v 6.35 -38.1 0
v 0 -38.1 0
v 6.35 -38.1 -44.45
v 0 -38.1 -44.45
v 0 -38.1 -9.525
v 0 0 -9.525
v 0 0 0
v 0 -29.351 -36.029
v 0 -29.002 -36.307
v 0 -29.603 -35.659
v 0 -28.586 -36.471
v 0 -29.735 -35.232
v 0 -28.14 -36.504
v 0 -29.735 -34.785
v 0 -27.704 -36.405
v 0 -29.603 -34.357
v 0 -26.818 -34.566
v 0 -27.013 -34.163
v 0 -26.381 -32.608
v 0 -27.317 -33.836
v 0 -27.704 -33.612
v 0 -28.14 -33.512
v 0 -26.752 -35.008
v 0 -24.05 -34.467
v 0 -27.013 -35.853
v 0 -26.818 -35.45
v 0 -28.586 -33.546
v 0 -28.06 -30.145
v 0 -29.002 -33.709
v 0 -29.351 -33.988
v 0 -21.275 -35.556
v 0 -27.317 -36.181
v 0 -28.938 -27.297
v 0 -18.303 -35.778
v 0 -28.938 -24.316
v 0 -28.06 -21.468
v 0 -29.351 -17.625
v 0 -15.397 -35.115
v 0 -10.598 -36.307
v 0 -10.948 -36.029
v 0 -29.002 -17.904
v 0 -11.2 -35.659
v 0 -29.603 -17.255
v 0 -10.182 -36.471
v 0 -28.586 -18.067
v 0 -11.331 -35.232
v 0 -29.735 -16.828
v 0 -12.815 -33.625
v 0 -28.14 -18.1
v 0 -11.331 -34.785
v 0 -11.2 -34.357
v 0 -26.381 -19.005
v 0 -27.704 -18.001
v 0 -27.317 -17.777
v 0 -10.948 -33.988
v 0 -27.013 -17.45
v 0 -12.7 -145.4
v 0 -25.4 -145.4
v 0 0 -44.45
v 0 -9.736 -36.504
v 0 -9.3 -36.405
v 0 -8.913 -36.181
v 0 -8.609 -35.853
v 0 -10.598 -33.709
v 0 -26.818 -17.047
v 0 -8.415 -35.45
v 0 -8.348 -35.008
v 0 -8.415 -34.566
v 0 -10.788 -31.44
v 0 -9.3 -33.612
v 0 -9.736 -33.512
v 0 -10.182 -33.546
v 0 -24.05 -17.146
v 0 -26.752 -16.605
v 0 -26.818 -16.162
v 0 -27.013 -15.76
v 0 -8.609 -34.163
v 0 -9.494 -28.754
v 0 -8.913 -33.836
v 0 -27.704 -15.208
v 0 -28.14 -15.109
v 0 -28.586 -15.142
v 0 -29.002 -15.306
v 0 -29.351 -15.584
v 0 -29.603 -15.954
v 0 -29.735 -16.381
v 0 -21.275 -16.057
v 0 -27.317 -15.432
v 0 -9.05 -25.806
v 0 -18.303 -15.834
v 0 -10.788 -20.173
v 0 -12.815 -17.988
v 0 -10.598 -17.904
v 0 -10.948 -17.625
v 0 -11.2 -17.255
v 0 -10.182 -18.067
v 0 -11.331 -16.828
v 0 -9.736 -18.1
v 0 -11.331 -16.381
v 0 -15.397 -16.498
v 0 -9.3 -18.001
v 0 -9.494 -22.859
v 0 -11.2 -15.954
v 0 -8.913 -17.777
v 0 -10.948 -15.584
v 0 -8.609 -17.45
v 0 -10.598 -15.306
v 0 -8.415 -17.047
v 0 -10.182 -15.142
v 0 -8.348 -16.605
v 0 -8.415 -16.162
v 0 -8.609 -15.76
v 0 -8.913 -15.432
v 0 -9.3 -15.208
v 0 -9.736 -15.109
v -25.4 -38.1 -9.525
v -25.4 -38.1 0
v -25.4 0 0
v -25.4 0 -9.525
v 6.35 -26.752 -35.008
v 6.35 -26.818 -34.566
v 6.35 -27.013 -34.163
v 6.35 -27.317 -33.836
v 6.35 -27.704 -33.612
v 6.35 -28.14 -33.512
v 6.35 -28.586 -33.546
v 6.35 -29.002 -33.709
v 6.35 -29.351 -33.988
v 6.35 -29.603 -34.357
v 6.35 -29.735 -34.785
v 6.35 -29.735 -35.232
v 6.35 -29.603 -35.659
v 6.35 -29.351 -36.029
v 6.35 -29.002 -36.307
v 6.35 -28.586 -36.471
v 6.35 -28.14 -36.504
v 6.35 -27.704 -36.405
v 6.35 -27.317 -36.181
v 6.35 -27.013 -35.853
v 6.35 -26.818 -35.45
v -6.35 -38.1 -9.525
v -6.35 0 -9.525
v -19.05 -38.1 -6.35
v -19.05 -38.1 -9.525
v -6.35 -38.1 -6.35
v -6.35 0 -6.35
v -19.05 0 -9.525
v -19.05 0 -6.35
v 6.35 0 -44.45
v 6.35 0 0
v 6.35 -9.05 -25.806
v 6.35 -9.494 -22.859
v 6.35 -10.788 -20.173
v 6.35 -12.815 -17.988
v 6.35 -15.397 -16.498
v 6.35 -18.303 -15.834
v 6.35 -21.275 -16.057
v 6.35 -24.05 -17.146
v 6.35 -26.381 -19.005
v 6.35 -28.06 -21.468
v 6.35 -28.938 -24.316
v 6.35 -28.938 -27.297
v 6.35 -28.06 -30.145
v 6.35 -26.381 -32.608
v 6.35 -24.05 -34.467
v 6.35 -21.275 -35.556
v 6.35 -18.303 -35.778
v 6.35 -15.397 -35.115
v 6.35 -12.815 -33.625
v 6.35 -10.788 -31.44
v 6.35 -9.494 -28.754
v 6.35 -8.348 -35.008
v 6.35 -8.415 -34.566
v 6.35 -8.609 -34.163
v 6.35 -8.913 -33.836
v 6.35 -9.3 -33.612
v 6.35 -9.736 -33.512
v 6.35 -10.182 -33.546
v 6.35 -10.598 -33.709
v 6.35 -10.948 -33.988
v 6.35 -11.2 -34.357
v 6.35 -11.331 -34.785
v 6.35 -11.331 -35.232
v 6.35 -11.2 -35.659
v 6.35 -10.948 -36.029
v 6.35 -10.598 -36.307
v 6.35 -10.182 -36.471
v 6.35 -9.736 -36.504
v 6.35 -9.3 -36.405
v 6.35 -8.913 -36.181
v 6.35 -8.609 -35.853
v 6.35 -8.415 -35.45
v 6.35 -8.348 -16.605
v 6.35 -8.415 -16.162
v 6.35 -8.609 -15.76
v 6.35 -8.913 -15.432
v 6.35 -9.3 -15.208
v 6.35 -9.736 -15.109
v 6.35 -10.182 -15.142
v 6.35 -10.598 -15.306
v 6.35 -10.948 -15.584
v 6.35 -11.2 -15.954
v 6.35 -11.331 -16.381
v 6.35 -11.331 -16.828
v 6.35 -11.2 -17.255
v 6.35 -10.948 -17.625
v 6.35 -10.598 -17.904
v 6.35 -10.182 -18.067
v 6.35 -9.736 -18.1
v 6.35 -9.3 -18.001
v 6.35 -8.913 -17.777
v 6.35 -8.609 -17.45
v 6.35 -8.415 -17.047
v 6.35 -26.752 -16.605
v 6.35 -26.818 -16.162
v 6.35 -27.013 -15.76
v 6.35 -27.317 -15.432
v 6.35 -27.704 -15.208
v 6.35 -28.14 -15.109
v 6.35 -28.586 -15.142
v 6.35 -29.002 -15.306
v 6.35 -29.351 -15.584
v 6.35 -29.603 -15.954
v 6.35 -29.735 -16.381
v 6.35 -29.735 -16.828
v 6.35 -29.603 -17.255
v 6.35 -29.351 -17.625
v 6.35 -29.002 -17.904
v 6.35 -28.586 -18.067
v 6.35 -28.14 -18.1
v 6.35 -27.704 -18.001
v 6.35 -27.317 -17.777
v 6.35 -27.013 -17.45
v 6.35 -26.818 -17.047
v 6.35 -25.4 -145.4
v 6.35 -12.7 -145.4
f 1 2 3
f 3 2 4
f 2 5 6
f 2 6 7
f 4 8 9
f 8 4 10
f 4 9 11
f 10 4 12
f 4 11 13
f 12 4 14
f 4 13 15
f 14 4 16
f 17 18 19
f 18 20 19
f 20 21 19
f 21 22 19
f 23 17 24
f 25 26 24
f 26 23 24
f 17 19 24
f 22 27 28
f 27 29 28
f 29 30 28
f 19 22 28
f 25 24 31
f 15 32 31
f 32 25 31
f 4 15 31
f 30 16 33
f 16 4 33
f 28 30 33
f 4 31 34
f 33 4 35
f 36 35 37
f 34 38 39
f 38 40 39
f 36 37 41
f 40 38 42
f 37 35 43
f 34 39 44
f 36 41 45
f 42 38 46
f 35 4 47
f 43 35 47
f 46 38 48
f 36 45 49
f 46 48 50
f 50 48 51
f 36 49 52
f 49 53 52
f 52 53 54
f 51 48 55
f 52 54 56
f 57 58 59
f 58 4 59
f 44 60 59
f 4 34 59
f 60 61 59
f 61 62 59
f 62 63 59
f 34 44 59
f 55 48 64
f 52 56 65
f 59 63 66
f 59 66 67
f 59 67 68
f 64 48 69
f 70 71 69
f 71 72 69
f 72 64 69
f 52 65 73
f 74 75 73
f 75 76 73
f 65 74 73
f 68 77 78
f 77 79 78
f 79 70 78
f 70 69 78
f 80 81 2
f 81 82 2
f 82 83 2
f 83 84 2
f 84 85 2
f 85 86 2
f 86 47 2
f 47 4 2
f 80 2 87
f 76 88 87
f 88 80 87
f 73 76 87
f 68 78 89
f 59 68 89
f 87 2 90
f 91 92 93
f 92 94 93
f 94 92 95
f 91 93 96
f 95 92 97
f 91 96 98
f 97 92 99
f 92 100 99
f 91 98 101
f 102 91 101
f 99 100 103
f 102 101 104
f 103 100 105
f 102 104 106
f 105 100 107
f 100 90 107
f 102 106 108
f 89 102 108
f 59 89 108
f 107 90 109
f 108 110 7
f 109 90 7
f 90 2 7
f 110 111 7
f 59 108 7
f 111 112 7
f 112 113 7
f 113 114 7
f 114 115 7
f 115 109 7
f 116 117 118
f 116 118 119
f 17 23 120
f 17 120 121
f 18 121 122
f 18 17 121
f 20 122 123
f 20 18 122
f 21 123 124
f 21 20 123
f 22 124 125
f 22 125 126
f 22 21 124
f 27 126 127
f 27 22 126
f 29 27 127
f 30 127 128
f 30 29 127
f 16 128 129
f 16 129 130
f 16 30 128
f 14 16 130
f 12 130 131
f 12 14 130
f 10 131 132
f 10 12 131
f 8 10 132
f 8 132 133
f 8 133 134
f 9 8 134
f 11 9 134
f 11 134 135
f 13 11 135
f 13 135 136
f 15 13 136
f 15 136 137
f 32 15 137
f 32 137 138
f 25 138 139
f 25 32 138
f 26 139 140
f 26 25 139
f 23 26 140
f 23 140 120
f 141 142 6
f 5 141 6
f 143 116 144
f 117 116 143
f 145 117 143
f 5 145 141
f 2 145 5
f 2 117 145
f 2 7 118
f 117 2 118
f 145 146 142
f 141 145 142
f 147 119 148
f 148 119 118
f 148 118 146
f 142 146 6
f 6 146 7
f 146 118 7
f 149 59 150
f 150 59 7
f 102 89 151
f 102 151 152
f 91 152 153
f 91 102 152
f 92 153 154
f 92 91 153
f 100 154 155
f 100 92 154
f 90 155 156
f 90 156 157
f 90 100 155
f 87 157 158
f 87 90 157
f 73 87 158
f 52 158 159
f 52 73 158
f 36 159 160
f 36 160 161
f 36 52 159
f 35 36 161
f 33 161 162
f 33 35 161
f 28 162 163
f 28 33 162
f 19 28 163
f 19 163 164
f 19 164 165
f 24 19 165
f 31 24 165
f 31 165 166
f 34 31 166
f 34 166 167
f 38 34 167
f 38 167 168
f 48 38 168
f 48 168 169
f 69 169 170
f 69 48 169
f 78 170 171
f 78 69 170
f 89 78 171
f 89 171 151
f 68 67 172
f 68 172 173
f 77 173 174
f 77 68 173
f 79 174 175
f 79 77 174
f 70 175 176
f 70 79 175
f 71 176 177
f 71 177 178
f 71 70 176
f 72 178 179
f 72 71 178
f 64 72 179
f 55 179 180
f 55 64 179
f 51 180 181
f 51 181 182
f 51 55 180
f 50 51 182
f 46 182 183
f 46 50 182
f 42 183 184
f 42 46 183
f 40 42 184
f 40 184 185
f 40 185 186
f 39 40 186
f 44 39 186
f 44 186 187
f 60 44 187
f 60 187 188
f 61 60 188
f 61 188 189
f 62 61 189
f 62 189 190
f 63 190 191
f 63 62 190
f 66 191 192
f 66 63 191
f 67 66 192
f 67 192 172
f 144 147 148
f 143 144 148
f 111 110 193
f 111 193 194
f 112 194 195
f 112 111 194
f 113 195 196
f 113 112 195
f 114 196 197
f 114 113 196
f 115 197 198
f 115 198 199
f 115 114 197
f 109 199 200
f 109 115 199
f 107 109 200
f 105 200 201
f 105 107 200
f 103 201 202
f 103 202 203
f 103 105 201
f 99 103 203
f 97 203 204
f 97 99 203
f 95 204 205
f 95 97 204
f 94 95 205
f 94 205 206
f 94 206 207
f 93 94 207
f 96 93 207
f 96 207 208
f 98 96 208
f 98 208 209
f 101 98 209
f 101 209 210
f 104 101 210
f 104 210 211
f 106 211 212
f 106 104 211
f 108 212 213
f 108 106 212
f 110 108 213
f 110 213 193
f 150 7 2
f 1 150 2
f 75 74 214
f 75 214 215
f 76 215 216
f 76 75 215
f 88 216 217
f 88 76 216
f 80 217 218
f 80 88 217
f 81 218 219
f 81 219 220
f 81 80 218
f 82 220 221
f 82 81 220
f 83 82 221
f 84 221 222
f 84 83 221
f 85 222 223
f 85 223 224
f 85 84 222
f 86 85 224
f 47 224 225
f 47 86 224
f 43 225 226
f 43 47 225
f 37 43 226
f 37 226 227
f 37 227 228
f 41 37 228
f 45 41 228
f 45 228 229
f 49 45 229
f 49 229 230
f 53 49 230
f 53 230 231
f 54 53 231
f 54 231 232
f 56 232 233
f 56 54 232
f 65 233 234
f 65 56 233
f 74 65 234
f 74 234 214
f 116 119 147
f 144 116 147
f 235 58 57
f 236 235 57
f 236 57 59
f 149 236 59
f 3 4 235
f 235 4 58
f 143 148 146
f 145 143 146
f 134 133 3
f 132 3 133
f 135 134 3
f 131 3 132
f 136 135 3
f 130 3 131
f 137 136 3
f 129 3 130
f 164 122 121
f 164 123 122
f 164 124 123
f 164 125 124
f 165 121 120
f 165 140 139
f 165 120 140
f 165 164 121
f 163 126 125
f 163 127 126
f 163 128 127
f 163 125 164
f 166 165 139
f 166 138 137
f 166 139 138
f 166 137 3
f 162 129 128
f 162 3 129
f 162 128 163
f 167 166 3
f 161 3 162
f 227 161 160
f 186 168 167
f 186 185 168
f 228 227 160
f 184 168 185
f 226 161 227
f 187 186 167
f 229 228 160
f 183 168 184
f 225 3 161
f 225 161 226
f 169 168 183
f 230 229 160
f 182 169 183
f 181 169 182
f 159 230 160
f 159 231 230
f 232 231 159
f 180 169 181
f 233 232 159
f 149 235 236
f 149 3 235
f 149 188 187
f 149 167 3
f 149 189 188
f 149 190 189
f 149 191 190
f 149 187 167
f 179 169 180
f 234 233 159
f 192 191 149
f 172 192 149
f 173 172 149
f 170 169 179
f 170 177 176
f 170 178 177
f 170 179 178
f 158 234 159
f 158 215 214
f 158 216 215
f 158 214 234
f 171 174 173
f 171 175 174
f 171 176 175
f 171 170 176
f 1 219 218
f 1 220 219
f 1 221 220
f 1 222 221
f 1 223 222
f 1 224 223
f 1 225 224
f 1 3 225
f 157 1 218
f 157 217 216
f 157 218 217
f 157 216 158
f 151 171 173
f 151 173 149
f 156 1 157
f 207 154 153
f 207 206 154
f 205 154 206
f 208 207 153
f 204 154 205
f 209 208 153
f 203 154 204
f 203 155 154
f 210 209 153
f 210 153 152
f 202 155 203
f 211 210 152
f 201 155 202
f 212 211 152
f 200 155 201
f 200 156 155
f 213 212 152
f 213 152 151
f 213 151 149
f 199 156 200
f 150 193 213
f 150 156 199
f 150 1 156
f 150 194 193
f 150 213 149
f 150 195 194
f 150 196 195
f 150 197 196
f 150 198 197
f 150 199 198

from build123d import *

# Parameters (mm, degrees)
F1_DEPTH = 38.1
F2_R     = 1.5
F2_R_2   = 10
F3_DEPTH = 6.35


with BuildPart() as f1:
    # F0 (on Front) → F1 (new body)
    with BuildSketch(Plane.XZ):
        Polygon((0, 0), (-25.4, 0), (-25.4, -9.525), (-19.05, -9.525), (-19.05, -6.35), (-6.35, -6.35), (-6.35, -9.525), (0, -9.525), align=None)
    extrude(amount=F1_DEPTH)


with BuildPart() as f3:
    # F2 (on Right) → F3 (new body)
    with BuildSketch(Plane.YZ):
        Polygon((-25.4, -145.4), (-12.7, -145.4), (0, -44.45), (0, 0), (-38.1, 0), (-38.1, -44.45), align=None)
        with Locations((-28.251859, -35.008259)):
            Circle(F2_R, mode=Mode.SUBTRACT)
        with Locations((-28.251859, -16.604541)):
            Circle(F2_R, mode=Mode.SUBTRACT)
        with Locations((-19.05, -25.8064)):
            Circle(F2_R_2, mode=Mode.SUBTRACT)
        with Locations((-9.848141, -35.008259)):
            Circle(F2_R, mode=Mode.SUBTRACT)
        with Locations((-9.848141, -16.604541)):
            Circle(F2_R, mode=Mode.SUBTRACT)
    extrude(amount=F3_DEPTH)


solid = Compound([f1.part, f3.part])
